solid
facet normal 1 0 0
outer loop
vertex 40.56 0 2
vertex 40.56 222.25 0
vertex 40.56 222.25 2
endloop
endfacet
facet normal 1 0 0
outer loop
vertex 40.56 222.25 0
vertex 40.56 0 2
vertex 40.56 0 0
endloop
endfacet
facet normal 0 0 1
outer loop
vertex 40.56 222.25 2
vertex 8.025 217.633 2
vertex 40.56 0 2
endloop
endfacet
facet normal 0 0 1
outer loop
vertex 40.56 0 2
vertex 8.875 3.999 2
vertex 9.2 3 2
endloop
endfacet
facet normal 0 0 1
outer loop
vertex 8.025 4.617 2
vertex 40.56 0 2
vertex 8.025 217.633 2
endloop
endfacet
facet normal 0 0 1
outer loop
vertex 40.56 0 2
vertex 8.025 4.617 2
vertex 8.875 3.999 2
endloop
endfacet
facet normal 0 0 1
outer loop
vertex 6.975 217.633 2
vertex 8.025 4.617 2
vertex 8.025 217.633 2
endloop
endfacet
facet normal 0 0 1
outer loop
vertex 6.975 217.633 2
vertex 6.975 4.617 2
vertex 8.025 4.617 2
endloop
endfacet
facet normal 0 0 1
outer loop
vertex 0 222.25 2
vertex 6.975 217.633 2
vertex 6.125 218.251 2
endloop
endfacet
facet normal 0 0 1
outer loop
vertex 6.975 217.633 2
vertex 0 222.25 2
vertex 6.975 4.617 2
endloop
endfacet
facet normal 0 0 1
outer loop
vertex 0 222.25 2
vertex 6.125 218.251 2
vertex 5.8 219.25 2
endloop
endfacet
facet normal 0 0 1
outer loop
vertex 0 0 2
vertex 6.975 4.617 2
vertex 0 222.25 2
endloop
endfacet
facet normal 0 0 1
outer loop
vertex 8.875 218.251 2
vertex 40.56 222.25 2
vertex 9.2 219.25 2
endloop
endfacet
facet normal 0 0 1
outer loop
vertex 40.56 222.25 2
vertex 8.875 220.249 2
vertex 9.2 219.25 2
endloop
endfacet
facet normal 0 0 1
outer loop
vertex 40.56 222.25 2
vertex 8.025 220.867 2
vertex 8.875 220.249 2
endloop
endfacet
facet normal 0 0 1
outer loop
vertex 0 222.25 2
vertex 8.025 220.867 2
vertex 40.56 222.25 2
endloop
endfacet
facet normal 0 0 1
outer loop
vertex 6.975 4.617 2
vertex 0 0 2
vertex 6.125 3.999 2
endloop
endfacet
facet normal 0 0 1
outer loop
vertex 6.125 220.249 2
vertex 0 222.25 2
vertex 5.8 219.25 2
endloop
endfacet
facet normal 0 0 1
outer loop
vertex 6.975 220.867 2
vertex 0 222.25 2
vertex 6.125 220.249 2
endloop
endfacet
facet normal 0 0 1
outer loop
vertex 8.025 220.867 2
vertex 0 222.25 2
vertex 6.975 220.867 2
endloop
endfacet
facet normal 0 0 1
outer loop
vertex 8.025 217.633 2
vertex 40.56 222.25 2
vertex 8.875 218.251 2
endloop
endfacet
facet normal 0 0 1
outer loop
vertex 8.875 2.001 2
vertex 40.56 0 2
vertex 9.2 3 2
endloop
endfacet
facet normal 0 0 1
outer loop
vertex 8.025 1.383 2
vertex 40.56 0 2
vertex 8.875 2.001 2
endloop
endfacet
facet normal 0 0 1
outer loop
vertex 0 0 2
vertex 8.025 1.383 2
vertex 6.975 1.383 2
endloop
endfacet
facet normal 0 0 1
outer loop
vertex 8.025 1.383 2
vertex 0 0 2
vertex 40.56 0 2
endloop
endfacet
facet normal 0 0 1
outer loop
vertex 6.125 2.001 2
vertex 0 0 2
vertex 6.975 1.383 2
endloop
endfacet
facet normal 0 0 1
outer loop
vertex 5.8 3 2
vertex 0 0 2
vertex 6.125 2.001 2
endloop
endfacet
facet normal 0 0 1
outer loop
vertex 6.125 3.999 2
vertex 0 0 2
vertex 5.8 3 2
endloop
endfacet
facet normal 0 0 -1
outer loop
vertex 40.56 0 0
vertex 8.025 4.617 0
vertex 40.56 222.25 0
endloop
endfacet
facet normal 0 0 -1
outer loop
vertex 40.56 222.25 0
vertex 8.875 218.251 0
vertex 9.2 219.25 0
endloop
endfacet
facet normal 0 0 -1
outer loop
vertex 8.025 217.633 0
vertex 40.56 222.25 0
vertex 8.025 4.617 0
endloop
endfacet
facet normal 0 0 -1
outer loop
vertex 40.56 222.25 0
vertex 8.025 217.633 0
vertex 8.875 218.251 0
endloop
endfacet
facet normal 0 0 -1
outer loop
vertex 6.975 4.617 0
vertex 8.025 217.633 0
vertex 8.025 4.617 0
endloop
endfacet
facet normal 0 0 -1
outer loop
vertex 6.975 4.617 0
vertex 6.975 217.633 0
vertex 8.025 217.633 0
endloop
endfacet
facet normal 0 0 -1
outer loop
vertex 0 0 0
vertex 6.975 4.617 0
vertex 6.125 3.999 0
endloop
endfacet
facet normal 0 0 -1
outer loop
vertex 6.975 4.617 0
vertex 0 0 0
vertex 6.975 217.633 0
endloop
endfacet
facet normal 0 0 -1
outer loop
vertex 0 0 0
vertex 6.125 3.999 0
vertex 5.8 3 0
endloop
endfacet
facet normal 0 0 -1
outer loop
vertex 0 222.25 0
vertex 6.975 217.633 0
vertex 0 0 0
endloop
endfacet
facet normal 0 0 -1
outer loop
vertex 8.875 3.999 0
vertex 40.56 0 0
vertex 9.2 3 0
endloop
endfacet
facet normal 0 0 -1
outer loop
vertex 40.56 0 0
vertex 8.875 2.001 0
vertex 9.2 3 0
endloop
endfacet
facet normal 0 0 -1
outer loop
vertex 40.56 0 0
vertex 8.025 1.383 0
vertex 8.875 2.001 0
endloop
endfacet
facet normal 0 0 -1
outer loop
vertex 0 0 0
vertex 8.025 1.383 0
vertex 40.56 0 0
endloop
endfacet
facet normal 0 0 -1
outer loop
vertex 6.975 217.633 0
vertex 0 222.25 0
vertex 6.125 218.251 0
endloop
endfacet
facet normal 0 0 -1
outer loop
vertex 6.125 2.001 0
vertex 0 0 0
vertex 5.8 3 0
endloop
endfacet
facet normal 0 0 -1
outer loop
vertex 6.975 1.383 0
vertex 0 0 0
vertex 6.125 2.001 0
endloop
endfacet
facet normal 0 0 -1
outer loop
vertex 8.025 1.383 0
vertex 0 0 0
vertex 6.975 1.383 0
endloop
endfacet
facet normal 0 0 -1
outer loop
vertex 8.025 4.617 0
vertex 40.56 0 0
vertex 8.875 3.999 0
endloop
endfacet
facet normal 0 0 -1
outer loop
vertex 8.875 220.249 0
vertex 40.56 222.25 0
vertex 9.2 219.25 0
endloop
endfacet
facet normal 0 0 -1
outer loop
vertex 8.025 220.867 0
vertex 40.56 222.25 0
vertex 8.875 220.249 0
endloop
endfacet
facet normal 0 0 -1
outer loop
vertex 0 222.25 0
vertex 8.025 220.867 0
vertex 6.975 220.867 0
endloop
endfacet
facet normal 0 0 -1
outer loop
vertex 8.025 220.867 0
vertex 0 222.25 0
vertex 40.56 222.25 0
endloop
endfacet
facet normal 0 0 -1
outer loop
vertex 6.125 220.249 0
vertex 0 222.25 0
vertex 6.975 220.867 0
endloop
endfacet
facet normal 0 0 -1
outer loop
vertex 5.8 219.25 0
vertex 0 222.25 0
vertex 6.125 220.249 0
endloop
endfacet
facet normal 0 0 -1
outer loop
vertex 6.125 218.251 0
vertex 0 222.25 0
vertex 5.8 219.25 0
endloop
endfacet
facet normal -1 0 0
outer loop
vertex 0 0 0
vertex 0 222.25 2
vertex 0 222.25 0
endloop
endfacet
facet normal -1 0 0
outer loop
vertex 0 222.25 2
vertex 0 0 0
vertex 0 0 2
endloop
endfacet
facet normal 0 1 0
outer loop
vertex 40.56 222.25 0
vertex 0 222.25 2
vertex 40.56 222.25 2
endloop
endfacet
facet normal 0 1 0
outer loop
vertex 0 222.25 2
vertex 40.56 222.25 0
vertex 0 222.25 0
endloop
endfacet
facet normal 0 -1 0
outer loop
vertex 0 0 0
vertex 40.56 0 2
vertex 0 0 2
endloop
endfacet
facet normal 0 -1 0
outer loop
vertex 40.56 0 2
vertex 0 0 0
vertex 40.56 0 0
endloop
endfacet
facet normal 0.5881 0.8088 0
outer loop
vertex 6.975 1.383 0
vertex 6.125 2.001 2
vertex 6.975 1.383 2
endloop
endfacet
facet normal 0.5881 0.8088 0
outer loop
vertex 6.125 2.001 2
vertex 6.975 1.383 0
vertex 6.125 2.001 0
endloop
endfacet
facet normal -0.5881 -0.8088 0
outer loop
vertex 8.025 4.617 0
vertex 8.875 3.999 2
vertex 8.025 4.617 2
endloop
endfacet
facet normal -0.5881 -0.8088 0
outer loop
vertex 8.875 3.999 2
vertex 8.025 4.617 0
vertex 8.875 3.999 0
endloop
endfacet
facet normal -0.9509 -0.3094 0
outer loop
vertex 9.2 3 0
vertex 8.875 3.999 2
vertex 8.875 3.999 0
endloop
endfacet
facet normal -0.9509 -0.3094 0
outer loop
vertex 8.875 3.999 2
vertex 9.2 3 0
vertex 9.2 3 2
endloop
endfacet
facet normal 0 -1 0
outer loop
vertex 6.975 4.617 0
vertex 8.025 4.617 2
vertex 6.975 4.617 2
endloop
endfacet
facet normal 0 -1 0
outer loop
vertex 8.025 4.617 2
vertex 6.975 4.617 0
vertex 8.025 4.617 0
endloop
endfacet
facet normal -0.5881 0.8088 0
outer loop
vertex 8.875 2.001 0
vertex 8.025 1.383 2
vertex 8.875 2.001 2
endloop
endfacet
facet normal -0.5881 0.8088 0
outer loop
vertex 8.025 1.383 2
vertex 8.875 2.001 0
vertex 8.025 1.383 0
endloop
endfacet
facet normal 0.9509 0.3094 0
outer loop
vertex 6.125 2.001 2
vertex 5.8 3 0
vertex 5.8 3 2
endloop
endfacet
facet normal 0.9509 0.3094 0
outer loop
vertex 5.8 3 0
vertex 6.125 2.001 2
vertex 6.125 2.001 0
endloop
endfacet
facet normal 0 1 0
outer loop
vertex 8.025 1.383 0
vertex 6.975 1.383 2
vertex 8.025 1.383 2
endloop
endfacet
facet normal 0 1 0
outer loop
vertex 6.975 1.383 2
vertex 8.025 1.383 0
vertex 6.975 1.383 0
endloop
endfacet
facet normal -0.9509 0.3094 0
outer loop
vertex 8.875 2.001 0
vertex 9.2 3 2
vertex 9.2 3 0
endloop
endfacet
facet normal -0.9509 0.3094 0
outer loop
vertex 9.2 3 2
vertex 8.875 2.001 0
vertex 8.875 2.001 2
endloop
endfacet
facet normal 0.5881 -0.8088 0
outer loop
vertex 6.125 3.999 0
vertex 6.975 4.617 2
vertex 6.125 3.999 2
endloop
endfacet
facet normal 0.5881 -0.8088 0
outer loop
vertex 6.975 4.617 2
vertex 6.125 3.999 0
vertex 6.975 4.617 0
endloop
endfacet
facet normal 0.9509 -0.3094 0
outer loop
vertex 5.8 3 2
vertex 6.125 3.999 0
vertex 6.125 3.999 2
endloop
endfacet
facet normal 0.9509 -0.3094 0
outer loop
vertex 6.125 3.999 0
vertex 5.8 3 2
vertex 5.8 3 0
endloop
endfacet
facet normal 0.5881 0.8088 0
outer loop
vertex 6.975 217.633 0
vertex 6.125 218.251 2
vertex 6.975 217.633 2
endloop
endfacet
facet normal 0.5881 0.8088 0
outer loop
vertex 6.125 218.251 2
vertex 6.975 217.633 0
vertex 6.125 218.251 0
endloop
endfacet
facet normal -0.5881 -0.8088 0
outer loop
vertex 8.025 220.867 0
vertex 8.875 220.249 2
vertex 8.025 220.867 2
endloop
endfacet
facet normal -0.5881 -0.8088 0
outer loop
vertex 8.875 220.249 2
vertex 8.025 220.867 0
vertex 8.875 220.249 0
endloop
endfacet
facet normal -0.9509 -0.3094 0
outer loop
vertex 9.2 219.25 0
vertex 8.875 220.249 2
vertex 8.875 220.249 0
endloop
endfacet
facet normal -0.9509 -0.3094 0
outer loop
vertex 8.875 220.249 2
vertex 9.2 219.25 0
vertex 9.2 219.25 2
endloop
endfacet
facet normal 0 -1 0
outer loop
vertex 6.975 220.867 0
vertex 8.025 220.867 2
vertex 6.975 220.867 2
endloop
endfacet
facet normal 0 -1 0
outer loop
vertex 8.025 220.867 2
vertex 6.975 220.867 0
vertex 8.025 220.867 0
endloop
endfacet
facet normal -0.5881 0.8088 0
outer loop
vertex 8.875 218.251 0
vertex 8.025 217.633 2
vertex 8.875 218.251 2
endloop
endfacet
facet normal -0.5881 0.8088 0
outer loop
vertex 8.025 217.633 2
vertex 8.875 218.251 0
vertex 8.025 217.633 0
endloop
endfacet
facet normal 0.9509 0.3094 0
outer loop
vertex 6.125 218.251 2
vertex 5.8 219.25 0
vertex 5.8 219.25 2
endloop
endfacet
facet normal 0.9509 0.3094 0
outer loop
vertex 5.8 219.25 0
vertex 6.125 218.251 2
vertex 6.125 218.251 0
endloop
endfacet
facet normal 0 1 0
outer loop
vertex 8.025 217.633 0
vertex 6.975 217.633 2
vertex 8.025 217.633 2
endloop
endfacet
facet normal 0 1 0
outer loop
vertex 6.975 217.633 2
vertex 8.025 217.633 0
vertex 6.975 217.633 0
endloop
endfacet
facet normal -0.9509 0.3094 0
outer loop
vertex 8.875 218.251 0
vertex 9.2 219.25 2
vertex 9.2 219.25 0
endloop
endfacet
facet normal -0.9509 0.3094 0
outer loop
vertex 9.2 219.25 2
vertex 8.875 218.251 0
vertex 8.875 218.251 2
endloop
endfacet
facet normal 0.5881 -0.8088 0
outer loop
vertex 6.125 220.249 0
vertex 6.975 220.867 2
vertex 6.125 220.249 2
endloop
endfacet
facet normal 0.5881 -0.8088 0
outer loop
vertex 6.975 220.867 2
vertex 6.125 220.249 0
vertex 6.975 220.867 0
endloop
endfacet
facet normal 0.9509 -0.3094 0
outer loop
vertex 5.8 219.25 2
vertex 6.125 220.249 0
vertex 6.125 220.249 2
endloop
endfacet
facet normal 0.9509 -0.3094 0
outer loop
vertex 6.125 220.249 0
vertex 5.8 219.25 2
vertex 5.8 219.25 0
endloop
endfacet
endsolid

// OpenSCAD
HP_SIZE = 5.07;
HU_SIZE = 44.45;

HOLE_R = 1.7;
HOLE_FROM_SIDE = 7.5;
HOLE_FROM_TOP = 3;

module plate(HP=1, thickness=2, HU=5 ) {

height=HU*HU_SIZE;
width=HP*HP_SIZE;
    
difference() {
	cube([width, height, thickness]);

	translate([HOLE_FROM_SIDE, HOLE_FROM_TOP, -1])
	cylinder(r=HOLE_R, h=10, $fn=10);

	translate([HOLE_FROM_SIDE, height-HOLE_FROM_TOP, -1])
	cylinder(r=HOLE_R, h=10, $fn=10);

	if (width > 50) {
		translate([width-HOLE_FROM_SIDE, HOLE_FROM_TOP, -1])
		cylinder(r=HOLE_R, h=10, $fn=10);

		translate([width-HOLE_FROM_SIDE, height-HOLE_FROM_TOP, -1])
		cylinder(r=HOLE_R, h=10, $fn=10);
	}
}
}

plate(HP=8);
